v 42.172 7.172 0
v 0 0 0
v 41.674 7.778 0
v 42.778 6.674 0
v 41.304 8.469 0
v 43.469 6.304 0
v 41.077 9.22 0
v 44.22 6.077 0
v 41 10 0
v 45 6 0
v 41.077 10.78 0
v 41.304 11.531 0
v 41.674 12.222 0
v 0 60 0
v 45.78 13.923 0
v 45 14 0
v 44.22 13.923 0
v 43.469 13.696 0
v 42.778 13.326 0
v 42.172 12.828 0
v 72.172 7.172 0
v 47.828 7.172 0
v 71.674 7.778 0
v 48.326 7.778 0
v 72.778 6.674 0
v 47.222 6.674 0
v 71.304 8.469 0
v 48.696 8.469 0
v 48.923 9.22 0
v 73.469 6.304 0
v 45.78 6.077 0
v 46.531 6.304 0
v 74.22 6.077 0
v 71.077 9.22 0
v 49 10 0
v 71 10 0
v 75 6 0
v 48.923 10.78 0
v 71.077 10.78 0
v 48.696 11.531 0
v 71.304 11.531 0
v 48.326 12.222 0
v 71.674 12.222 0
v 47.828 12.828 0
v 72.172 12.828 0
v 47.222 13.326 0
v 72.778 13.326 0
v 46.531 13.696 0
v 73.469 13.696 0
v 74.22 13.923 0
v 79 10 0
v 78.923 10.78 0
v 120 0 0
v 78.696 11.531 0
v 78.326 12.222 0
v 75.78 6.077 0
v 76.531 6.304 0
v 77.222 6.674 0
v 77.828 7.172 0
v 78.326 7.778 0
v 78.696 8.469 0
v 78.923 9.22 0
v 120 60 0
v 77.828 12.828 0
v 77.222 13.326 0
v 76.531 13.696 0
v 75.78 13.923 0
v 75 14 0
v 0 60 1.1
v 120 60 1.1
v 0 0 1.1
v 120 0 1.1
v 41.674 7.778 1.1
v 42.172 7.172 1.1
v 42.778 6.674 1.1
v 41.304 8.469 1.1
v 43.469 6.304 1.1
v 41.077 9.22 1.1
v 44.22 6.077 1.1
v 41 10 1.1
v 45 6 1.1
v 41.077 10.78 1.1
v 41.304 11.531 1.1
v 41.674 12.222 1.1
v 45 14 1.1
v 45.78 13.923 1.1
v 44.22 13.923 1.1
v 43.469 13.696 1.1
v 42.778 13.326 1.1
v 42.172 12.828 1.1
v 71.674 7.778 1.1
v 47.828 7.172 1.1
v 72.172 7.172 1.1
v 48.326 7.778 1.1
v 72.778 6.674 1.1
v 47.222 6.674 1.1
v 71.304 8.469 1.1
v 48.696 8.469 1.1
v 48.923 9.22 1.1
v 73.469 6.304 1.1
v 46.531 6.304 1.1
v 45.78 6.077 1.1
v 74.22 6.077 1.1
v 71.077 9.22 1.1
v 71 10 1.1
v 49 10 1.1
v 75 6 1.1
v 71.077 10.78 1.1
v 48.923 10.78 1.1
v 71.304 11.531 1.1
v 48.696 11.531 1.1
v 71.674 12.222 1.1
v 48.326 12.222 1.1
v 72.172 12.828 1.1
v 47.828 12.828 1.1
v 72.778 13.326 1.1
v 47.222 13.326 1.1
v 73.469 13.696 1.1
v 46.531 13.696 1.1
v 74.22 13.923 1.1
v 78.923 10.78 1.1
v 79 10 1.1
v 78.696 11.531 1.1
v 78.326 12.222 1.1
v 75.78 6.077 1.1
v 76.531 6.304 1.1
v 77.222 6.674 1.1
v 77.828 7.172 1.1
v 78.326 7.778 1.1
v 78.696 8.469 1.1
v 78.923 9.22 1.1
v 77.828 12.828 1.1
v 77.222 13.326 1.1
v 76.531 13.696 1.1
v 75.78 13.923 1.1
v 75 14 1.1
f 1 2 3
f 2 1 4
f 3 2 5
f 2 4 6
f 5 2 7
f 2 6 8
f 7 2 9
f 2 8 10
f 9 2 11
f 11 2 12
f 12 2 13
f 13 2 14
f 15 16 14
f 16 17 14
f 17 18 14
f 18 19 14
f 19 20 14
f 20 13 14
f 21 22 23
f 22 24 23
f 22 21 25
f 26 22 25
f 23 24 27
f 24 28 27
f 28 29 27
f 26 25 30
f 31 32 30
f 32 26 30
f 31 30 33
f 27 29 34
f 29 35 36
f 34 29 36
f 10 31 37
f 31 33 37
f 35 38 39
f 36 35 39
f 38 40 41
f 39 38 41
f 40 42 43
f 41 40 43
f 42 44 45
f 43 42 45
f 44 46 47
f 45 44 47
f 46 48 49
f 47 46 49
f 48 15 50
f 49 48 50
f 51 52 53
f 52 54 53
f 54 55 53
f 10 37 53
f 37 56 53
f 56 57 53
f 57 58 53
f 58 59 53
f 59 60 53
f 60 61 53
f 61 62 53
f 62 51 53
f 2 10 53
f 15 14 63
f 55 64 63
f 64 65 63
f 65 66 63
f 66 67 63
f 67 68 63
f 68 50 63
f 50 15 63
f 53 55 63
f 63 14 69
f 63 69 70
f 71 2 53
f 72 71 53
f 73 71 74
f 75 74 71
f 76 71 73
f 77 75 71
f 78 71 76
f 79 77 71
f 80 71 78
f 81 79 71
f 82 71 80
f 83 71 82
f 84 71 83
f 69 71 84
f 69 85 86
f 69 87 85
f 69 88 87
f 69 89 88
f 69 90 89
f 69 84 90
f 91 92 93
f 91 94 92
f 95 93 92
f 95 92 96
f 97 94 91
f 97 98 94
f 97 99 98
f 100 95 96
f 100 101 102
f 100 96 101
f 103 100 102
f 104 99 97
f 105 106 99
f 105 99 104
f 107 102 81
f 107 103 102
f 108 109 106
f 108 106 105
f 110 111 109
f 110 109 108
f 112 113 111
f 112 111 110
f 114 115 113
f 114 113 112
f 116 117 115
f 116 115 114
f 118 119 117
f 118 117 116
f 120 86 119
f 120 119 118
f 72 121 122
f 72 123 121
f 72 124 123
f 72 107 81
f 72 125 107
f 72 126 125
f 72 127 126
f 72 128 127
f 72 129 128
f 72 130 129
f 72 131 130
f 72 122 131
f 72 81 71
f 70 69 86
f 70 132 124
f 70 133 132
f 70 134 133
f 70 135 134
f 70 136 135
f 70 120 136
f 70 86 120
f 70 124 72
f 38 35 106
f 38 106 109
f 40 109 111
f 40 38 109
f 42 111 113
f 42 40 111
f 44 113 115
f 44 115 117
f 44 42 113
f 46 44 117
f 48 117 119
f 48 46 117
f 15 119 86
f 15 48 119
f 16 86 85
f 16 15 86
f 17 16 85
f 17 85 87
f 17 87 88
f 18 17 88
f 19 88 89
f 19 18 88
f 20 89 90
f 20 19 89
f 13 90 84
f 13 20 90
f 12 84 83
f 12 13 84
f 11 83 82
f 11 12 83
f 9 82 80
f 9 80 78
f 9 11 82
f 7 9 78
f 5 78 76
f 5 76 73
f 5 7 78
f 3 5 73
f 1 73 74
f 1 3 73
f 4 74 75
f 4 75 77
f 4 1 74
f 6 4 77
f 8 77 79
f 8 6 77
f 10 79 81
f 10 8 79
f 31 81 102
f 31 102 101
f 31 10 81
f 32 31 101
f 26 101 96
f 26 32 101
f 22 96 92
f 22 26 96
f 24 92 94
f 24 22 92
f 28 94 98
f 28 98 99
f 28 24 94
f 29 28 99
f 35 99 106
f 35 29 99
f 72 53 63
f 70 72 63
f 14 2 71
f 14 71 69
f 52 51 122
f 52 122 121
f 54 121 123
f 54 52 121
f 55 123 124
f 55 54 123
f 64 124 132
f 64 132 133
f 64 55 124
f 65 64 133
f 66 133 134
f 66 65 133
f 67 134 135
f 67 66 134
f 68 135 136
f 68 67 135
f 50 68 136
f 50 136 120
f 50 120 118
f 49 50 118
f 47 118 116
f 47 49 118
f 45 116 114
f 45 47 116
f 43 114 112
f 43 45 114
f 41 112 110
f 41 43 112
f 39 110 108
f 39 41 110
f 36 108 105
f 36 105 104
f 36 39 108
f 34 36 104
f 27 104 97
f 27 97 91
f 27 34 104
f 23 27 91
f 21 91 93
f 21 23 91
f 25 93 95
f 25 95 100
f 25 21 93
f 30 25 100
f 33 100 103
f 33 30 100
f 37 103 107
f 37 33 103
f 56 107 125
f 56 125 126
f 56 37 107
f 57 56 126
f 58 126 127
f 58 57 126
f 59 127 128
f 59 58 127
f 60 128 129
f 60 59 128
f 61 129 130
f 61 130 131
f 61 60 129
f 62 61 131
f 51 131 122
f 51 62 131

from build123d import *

# Parameters (mm, degrees)
CYLINDER001_R     = 4
CYLINDER001_DEPTH = 1.1
CYLINDER_R        = 4
CYLINDER_DEPTH    = 1.1
BOX_W             = 120
BOX_H             = 60
BOX_DEPTH         = 1.1


with BuildPart() as cylinder001:
    # Cylinder001 → Cylinder001 (new body)
    with BuildSketch(Plane(origin=(75, 10, 0), x_dir=(1, 0, 0), z_dir=(0, 0, 1))):
        Circle(CYLINDER001_R)
    extrude(amount=CYLINDER001_DEPTH)


with BuildPart() as cylinder:
    # Cylinder → Cylinder (new body)
    with BuildSketch(Plane(origin=(45, 10, 0), x_dir=(1, 0, 0), z_dir=(0, 0, 1))):
        Circle(CYLINDER_R)
    extrude(amount=CYLINDER_DEPTH)


with BuildPart() as cut001:
    # Box → Box (new body)
    with BuildSketch(Plane.XY):
        with Locations((60, 30)):
            Rectangle(BOX_W, BOX_H)
    extrude(amount=BOX_DEPTH)

    # Cut: cut Cylinder
    add(cylinder.part, mode=Mode.SUBTRACT)

    # Cut001: cut Cylinder001
    add(cylinder001.part, mode=Mode.SUBTRACT)


solid = cut001.part
